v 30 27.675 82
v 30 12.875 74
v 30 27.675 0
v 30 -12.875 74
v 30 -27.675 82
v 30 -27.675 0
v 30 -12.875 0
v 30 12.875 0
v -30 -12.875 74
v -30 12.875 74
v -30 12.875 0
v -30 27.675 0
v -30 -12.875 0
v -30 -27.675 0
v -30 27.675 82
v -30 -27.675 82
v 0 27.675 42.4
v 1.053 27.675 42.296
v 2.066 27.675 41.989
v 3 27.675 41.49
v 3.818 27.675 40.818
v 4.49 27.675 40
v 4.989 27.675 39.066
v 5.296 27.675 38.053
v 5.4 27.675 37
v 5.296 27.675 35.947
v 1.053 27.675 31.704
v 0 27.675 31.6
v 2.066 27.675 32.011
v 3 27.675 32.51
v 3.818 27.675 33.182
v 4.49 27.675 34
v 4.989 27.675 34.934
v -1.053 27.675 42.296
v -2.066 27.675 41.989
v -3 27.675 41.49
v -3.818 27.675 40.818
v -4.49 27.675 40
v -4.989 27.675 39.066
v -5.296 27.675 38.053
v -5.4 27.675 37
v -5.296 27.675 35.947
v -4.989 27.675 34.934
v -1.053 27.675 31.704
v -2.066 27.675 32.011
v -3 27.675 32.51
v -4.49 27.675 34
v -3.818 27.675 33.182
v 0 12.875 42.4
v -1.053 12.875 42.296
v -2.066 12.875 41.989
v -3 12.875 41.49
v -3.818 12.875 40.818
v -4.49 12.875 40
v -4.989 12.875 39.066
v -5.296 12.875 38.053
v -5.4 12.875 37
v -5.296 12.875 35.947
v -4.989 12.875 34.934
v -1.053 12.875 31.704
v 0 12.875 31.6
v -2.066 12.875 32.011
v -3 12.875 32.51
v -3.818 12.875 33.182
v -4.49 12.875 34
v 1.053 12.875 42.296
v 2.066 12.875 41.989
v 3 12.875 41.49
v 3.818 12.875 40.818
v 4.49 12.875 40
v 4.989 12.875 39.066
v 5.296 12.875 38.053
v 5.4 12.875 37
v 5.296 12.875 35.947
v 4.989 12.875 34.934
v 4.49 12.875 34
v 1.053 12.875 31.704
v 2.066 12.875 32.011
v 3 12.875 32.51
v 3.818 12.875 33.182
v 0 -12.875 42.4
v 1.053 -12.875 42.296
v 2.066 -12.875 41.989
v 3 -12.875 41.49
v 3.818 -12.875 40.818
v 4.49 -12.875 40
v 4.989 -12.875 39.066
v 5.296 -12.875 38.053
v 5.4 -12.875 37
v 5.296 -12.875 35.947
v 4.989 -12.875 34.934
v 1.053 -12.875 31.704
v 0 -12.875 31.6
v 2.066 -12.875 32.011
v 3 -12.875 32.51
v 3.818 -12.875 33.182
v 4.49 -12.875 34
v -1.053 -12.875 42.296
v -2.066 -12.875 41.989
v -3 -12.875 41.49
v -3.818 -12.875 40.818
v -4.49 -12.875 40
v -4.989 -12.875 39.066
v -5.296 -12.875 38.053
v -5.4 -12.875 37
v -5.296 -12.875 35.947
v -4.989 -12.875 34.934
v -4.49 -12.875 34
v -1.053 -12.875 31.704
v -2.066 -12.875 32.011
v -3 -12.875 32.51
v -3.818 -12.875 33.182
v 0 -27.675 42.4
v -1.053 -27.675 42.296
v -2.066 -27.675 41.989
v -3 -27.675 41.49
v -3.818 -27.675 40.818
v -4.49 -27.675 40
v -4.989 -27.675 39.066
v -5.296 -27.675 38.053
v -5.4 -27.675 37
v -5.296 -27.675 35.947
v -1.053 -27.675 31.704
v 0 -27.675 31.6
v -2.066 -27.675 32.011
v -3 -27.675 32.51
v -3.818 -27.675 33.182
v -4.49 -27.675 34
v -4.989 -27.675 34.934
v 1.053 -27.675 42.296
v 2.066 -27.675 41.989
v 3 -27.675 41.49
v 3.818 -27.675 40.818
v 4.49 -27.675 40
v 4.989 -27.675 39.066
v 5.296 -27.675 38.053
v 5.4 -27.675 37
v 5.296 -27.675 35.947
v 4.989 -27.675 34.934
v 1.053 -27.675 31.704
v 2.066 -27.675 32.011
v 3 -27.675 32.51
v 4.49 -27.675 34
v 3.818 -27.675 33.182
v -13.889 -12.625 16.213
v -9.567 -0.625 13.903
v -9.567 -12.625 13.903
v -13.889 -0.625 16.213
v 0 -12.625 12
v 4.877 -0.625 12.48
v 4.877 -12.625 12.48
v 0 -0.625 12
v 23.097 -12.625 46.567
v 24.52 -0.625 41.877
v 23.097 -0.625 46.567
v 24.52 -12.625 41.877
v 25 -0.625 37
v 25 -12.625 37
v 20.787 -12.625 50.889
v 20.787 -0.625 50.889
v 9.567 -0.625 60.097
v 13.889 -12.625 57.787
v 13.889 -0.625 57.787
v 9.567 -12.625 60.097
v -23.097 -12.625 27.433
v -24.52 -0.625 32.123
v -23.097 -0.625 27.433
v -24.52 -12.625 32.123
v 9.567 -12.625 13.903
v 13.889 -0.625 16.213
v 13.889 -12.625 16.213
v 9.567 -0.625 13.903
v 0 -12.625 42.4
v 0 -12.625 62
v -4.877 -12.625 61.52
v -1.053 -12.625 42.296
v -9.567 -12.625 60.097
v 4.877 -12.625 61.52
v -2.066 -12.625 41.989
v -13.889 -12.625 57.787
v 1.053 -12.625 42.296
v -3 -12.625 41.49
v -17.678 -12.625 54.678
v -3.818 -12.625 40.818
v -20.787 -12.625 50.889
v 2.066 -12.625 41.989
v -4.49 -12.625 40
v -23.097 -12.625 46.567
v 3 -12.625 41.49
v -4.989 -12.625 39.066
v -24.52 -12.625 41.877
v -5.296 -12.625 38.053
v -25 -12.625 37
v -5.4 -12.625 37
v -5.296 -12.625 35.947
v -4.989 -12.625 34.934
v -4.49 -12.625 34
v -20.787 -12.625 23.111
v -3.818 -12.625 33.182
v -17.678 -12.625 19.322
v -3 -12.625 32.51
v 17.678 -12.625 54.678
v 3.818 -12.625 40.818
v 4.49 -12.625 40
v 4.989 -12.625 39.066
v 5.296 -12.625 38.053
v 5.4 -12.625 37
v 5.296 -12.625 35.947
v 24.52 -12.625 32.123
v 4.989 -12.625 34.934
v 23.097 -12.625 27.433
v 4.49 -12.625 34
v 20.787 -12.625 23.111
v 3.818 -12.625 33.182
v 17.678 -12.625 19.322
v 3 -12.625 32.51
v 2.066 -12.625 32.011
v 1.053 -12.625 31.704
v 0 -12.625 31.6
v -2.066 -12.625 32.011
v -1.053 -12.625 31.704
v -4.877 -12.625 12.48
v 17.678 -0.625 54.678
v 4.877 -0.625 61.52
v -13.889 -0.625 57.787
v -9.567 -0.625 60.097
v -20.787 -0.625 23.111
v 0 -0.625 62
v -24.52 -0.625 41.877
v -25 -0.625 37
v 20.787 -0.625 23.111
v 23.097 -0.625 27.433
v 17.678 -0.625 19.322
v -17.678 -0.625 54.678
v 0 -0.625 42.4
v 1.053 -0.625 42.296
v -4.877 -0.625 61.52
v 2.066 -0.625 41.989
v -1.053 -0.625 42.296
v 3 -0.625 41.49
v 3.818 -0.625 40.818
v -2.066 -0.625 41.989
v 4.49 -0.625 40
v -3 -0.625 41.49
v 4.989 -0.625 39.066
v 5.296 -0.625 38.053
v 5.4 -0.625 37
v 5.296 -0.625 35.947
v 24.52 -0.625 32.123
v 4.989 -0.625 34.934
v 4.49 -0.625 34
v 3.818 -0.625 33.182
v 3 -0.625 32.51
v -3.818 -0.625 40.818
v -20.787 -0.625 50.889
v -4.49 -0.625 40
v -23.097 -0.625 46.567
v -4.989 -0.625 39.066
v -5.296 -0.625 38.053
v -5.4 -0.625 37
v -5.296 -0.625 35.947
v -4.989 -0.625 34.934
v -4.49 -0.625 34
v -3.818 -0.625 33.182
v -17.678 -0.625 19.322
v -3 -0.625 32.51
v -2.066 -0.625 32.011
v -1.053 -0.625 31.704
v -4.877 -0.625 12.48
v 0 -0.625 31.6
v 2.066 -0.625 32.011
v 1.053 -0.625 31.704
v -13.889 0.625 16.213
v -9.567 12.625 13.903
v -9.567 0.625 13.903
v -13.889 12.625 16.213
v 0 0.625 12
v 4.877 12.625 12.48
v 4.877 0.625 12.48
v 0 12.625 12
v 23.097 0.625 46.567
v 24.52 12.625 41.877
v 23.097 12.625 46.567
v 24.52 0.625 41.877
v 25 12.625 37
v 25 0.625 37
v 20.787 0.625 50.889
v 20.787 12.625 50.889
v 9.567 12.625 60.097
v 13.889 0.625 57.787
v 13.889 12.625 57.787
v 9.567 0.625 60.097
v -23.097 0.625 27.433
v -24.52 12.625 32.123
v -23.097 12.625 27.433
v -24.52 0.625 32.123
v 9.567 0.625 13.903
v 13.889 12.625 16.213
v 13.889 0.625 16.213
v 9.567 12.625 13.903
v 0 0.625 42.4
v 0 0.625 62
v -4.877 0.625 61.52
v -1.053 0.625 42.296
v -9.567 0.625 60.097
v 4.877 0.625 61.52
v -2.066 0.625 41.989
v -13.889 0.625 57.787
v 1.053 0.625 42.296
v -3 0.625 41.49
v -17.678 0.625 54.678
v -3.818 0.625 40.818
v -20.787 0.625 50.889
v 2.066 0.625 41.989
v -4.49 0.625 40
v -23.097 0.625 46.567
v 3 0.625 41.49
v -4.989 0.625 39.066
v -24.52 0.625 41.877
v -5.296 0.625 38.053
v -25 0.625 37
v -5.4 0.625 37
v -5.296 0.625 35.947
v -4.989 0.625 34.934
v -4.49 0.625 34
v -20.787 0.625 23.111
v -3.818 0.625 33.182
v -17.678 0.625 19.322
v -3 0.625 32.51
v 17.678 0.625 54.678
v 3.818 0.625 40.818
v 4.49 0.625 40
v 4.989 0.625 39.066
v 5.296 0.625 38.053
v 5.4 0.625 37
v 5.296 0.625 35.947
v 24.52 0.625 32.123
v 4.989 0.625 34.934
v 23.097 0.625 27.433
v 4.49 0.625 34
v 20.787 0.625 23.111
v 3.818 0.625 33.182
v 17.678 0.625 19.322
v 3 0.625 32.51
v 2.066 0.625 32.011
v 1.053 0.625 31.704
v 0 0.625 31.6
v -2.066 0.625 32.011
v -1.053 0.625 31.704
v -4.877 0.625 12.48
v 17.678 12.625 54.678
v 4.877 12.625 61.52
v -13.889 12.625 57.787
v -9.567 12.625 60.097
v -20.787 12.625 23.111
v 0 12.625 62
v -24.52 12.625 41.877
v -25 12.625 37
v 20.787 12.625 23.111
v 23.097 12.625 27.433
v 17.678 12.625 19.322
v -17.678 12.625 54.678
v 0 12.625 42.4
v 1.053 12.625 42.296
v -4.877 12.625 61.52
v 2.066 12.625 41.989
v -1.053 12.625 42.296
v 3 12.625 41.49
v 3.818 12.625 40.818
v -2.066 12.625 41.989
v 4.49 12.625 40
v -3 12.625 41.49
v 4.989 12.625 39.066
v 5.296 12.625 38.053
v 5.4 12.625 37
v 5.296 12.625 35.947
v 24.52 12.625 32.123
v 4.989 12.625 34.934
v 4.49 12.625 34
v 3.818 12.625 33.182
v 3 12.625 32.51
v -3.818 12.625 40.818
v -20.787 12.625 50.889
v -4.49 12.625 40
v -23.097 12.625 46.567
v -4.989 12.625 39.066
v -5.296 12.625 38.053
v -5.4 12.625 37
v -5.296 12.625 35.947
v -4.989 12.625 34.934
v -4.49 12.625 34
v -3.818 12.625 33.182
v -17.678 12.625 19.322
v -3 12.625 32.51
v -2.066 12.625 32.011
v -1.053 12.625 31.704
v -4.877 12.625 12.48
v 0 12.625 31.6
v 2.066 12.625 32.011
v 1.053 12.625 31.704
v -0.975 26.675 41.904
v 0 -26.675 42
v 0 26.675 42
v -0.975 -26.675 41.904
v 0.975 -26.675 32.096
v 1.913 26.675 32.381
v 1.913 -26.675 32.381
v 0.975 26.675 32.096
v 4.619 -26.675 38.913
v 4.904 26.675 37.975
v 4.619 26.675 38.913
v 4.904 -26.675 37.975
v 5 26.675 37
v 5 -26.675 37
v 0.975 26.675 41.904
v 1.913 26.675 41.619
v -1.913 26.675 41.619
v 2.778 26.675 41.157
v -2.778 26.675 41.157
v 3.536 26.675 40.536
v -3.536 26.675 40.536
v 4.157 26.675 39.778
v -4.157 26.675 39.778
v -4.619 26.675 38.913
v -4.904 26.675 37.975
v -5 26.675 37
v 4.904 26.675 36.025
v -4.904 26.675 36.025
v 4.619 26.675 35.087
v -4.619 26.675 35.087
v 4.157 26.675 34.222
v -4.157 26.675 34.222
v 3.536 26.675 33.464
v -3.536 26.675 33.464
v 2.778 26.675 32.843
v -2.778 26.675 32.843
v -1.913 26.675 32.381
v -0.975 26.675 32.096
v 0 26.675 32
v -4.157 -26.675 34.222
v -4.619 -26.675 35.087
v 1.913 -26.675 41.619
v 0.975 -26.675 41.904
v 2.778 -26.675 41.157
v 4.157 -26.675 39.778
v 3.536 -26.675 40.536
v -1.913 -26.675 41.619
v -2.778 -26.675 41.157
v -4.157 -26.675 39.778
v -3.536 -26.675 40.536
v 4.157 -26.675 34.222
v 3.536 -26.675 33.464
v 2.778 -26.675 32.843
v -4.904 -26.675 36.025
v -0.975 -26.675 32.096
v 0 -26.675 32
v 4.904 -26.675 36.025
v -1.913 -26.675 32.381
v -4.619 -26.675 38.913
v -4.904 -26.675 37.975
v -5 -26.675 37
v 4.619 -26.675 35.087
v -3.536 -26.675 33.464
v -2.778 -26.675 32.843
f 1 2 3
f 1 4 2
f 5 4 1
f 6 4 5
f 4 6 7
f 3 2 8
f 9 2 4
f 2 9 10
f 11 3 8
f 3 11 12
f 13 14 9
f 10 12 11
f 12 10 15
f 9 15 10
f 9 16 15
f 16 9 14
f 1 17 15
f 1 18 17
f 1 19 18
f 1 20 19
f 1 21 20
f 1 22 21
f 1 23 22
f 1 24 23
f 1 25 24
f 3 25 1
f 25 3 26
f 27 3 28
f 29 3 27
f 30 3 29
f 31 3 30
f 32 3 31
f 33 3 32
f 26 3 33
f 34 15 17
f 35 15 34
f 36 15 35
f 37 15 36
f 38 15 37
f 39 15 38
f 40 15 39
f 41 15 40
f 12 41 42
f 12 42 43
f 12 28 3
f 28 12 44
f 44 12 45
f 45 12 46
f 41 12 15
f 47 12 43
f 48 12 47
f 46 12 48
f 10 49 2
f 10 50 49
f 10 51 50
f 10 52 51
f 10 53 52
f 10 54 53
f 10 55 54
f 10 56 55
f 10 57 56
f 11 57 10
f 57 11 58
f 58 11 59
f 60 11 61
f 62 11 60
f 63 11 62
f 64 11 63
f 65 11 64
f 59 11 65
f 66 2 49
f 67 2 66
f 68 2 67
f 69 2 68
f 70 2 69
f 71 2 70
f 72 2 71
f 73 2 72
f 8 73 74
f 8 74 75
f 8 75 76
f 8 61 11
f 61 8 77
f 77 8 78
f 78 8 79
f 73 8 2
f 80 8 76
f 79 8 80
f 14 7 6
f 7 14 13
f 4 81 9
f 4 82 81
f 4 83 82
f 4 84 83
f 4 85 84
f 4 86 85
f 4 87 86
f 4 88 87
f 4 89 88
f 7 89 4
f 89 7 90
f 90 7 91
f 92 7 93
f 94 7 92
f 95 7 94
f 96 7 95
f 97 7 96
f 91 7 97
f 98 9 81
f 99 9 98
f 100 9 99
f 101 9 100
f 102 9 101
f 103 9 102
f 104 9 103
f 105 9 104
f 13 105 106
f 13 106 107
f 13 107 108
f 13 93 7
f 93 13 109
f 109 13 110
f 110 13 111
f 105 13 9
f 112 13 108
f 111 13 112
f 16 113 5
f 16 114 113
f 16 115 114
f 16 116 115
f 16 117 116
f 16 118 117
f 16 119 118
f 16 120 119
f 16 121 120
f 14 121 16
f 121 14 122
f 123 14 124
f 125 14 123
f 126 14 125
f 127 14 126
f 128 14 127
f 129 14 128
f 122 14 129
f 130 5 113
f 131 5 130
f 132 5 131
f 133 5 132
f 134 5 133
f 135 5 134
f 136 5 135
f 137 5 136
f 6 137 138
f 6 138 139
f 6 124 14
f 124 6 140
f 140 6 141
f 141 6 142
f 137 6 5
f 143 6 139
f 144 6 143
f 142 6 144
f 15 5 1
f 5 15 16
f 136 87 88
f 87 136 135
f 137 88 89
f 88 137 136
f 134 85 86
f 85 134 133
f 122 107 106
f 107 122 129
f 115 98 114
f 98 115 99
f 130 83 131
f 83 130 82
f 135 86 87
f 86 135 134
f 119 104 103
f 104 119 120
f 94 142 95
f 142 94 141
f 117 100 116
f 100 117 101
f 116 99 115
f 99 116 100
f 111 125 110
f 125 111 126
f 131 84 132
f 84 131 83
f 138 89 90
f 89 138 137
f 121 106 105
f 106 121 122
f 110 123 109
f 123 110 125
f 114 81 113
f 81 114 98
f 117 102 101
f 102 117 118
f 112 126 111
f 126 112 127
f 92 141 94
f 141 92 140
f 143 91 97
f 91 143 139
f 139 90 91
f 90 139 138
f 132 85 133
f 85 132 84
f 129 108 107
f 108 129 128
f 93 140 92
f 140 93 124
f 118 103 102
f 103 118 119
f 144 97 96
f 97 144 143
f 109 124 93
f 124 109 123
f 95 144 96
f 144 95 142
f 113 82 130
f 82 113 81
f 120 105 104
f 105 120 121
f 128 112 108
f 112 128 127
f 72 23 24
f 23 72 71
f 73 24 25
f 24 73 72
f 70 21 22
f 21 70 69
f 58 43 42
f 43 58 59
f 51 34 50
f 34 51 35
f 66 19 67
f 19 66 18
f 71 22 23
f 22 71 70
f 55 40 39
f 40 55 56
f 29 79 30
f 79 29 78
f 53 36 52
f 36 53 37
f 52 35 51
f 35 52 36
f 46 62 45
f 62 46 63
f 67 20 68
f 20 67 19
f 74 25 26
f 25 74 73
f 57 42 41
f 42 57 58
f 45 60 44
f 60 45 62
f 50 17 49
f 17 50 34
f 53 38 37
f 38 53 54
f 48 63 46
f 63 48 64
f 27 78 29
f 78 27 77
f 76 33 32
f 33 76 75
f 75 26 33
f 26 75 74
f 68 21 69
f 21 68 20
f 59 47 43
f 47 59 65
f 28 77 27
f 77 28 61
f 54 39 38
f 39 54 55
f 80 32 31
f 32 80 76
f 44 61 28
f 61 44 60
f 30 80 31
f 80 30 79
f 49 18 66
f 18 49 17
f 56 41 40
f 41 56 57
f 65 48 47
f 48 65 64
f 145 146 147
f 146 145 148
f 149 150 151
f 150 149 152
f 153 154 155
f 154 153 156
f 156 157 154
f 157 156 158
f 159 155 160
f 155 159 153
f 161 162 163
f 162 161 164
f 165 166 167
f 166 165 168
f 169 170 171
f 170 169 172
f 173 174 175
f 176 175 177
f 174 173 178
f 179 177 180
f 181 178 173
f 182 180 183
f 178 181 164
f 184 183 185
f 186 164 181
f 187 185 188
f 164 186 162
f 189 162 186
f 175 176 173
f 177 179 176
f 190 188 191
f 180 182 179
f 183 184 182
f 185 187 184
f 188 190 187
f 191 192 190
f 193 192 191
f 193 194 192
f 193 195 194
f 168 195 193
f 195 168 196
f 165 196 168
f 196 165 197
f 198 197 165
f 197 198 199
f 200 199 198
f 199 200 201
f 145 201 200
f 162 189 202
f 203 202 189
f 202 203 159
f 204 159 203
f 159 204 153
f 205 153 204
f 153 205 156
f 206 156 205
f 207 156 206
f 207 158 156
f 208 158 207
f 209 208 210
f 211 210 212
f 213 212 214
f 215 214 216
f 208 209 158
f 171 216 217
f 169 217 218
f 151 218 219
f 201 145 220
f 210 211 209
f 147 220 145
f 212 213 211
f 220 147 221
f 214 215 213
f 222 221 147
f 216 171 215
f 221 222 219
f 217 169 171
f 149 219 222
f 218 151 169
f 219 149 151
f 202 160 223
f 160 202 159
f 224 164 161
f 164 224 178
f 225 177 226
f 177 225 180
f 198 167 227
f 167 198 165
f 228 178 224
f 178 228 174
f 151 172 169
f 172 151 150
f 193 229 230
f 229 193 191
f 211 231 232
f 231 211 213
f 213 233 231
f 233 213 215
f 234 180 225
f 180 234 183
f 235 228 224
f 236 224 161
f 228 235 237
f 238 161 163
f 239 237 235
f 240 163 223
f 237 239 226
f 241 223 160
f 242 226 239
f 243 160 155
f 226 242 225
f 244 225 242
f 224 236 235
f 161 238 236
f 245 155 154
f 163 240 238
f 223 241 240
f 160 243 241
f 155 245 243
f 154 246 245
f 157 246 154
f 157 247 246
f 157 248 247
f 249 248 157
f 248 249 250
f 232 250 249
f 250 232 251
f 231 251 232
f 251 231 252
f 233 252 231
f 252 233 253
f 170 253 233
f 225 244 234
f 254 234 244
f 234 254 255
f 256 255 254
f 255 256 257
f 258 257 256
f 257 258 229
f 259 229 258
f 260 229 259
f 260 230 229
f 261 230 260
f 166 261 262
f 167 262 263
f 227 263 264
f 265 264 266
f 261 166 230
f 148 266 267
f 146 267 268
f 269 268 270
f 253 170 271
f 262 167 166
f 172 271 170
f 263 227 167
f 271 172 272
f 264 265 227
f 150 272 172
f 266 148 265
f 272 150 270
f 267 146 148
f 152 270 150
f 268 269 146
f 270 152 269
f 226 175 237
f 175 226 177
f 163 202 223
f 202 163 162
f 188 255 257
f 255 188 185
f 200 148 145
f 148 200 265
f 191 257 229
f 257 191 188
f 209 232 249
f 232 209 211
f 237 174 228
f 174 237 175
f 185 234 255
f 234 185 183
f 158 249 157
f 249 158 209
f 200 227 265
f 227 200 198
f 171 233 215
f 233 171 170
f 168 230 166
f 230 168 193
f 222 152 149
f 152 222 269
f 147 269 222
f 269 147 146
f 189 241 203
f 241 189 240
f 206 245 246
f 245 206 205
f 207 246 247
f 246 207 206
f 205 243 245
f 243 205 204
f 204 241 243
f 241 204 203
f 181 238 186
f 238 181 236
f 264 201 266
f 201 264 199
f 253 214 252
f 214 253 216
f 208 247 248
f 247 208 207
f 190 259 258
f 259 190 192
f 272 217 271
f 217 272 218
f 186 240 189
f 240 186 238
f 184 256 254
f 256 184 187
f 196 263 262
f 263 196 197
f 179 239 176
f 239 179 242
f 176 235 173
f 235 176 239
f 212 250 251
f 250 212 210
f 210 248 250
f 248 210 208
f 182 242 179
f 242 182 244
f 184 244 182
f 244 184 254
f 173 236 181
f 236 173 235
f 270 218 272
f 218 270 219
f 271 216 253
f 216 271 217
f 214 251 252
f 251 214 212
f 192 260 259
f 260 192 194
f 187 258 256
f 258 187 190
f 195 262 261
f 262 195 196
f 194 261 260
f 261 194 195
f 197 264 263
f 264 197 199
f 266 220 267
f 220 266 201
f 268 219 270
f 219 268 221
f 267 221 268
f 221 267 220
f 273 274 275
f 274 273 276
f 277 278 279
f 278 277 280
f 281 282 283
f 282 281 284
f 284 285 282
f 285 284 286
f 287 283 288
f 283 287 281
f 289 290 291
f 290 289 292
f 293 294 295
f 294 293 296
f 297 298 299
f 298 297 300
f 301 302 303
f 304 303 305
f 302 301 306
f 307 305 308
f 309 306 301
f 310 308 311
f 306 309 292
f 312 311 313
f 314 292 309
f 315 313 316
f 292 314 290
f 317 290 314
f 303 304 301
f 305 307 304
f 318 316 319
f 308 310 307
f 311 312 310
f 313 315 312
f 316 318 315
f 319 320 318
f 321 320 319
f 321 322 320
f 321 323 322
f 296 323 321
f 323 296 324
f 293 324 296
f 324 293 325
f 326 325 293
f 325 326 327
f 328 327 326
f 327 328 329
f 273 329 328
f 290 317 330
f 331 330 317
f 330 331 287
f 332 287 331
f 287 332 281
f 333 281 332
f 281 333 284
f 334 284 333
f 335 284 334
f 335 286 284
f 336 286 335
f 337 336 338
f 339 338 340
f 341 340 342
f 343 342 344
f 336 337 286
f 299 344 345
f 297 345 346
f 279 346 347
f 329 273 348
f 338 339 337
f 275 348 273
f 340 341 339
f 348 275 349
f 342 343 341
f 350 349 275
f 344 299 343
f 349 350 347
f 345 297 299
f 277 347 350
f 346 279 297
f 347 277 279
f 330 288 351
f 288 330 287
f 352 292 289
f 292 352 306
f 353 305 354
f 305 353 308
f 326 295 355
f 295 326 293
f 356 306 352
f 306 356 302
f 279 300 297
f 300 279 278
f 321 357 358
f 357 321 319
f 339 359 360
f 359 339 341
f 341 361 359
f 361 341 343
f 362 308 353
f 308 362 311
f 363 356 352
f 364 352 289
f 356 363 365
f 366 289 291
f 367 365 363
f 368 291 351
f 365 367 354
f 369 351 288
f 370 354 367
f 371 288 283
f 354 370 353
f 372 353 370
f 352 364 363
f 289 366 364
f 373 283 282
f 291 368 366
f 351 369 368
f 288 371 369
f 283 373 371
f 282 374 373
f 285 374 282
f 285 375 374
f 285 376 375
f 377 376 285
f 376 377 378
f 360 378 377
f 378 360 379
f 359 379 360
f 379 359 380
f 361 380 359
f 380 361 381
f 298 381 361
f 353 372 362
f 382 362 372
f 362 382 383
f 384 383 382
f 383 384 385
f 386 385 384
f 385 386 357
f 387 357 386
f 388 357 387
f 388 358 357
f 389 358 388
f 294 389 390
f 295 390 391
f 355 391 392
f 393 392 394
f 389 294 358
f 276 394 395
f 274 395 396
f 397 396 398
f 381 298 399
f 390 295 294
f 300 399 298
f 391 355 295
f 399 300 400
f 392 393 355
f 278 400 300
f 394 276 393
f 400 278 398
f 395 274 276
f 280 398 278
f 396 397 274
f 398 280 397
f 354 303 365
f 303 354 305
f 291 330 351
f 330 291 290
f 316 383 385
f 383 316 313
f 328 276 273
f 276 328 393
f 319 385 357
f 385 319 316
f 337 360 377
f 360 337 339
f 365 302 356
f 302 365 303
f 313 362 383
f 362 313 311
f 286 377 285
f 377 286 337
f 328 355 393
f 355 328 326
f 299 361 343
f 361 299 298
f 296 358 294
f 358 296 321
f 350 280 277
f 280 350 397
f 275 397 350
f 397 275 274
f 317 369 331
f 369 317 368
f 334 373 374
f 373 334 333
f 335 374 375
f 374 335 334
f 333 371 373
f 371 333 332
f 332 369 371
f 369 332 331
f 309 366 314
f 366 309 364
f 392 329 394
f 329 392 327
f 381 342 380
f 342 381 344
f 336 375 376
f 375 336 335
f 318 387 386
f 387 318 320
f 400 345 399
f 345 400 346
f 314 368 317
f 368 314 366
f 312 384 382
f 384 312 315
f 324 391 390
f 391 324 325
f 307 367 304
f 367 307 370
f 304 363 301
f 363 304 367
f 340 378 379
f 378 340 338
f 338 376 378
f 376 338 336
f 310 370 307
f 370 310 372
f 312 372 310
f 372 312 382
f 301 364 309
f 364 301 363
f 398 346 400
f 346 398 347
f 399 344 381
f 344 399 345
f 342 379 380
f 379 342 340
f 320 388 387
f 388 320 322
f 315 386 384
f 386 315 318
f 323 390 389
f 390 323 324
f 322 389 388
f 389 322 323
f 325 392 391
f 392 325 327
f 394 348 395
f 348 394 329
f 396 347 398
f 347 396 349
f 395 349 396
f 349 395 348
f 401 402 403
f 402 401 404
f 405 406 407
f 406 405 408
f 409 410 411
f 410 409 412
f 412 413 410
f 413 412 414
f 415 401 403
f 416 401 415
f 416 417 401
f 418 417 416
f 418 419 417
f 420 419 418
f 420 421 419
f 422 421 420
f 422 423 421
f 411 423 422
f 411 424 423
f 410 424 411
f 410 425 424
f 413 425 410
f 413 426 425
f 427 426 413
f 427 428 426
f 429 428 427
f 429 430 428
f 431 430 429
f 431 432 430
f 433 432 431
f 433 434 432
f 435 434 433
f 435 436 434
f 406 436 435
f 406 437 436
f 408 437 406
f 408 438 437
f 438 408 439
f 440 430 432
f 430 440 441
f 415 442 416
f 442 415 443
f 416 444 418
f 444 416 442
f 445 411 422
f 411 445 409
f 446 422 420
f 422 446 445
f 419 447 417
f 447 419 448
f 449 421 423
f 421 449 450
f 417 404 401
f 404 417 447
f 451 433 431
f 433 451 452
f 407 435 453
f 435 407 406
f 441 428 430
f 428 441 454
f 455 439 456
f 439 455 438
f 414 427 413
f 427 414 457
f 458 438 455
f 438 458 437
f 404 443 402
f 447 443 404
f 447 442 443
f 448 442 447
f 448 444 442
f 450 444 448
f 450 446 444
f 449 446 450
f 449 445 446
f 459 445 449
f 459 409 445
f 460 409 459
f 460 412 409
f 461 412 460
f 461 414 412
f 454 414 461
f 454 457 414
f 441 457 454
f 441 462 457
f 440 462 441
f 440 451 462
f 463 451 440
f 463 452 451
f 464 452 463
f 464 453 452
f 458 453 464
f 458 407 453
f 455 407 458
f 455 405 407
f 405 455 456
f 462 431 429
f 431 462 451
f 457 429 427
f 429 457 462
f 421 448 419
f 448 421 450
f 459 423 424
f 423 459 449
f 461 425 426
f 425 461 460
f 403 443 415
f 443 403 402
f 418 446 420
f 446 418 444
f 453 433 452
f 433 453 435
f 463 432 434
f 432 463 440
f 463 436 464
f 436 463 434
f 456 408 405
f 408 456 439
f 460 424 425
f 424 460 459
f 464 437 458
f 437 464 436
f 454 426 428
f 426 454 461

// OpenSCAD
$fn = 32;

// ------------------------------------------------------------------------
// Trolley wheel set: wheels d50, fork 74 mm tall
// Every part is its own module, assembly() places every instance.
// ------------------------------------------------------------------------

// --- part 1 ---
module trolley_fork() {
  difference() {
    union() {
      translate([-30, 12.875, 0]) cube([60, 14.8, 74]);
      translate([-30, -27.675, 0]) cube([60, 14.8, 74]);
      translate([-30, -27.675, 74]) cube([60, 55.35, 8]);
    }
    translate([0, -20.275, 37]) rotate([90, 0, 0]) cylinder(h = 16.8, d = 10.8, center = true);
    translate([0, 20.275, 37]) rotate([90, 0, 0]) cylinder(h = 16.8, d = 10.8, center = true);
  }
}

// --- part 2 ---
module trolley_wheel() {
  difference() {
      translate([0, 0, 0]) cylinder(h = 12, d = 50);
      translate([0, 0, -1]) cylinder(h = 14, d = 10.8);
    }
}

// --- part 3 ---
module trolley_axle() {
  translate([0, 0, -26.675]) cylinder(h = 53.35, d = 10);
}

// --- assembly ---
module assembly() {
  color([0.80, 0.24, 0.20]) translate([0, 0, 0]) rotate([0, 0, 0]) trolley_fork();
  color([0.20, 0.45, 0.75]) translate([0, -0.625, 37]) rotate([90, 0, 0]) trolley_wheel();
  color([0.25, 0.62, 0.32]) translate([0, 12.625, 37]) rotate([90, 0, 0]) trolley_wheel();
  color([0.92, 0.70, 0.18]) translate([0, 0, 37]) rotate([90, 0, 0]) trolley_axle();
}

assembly();
